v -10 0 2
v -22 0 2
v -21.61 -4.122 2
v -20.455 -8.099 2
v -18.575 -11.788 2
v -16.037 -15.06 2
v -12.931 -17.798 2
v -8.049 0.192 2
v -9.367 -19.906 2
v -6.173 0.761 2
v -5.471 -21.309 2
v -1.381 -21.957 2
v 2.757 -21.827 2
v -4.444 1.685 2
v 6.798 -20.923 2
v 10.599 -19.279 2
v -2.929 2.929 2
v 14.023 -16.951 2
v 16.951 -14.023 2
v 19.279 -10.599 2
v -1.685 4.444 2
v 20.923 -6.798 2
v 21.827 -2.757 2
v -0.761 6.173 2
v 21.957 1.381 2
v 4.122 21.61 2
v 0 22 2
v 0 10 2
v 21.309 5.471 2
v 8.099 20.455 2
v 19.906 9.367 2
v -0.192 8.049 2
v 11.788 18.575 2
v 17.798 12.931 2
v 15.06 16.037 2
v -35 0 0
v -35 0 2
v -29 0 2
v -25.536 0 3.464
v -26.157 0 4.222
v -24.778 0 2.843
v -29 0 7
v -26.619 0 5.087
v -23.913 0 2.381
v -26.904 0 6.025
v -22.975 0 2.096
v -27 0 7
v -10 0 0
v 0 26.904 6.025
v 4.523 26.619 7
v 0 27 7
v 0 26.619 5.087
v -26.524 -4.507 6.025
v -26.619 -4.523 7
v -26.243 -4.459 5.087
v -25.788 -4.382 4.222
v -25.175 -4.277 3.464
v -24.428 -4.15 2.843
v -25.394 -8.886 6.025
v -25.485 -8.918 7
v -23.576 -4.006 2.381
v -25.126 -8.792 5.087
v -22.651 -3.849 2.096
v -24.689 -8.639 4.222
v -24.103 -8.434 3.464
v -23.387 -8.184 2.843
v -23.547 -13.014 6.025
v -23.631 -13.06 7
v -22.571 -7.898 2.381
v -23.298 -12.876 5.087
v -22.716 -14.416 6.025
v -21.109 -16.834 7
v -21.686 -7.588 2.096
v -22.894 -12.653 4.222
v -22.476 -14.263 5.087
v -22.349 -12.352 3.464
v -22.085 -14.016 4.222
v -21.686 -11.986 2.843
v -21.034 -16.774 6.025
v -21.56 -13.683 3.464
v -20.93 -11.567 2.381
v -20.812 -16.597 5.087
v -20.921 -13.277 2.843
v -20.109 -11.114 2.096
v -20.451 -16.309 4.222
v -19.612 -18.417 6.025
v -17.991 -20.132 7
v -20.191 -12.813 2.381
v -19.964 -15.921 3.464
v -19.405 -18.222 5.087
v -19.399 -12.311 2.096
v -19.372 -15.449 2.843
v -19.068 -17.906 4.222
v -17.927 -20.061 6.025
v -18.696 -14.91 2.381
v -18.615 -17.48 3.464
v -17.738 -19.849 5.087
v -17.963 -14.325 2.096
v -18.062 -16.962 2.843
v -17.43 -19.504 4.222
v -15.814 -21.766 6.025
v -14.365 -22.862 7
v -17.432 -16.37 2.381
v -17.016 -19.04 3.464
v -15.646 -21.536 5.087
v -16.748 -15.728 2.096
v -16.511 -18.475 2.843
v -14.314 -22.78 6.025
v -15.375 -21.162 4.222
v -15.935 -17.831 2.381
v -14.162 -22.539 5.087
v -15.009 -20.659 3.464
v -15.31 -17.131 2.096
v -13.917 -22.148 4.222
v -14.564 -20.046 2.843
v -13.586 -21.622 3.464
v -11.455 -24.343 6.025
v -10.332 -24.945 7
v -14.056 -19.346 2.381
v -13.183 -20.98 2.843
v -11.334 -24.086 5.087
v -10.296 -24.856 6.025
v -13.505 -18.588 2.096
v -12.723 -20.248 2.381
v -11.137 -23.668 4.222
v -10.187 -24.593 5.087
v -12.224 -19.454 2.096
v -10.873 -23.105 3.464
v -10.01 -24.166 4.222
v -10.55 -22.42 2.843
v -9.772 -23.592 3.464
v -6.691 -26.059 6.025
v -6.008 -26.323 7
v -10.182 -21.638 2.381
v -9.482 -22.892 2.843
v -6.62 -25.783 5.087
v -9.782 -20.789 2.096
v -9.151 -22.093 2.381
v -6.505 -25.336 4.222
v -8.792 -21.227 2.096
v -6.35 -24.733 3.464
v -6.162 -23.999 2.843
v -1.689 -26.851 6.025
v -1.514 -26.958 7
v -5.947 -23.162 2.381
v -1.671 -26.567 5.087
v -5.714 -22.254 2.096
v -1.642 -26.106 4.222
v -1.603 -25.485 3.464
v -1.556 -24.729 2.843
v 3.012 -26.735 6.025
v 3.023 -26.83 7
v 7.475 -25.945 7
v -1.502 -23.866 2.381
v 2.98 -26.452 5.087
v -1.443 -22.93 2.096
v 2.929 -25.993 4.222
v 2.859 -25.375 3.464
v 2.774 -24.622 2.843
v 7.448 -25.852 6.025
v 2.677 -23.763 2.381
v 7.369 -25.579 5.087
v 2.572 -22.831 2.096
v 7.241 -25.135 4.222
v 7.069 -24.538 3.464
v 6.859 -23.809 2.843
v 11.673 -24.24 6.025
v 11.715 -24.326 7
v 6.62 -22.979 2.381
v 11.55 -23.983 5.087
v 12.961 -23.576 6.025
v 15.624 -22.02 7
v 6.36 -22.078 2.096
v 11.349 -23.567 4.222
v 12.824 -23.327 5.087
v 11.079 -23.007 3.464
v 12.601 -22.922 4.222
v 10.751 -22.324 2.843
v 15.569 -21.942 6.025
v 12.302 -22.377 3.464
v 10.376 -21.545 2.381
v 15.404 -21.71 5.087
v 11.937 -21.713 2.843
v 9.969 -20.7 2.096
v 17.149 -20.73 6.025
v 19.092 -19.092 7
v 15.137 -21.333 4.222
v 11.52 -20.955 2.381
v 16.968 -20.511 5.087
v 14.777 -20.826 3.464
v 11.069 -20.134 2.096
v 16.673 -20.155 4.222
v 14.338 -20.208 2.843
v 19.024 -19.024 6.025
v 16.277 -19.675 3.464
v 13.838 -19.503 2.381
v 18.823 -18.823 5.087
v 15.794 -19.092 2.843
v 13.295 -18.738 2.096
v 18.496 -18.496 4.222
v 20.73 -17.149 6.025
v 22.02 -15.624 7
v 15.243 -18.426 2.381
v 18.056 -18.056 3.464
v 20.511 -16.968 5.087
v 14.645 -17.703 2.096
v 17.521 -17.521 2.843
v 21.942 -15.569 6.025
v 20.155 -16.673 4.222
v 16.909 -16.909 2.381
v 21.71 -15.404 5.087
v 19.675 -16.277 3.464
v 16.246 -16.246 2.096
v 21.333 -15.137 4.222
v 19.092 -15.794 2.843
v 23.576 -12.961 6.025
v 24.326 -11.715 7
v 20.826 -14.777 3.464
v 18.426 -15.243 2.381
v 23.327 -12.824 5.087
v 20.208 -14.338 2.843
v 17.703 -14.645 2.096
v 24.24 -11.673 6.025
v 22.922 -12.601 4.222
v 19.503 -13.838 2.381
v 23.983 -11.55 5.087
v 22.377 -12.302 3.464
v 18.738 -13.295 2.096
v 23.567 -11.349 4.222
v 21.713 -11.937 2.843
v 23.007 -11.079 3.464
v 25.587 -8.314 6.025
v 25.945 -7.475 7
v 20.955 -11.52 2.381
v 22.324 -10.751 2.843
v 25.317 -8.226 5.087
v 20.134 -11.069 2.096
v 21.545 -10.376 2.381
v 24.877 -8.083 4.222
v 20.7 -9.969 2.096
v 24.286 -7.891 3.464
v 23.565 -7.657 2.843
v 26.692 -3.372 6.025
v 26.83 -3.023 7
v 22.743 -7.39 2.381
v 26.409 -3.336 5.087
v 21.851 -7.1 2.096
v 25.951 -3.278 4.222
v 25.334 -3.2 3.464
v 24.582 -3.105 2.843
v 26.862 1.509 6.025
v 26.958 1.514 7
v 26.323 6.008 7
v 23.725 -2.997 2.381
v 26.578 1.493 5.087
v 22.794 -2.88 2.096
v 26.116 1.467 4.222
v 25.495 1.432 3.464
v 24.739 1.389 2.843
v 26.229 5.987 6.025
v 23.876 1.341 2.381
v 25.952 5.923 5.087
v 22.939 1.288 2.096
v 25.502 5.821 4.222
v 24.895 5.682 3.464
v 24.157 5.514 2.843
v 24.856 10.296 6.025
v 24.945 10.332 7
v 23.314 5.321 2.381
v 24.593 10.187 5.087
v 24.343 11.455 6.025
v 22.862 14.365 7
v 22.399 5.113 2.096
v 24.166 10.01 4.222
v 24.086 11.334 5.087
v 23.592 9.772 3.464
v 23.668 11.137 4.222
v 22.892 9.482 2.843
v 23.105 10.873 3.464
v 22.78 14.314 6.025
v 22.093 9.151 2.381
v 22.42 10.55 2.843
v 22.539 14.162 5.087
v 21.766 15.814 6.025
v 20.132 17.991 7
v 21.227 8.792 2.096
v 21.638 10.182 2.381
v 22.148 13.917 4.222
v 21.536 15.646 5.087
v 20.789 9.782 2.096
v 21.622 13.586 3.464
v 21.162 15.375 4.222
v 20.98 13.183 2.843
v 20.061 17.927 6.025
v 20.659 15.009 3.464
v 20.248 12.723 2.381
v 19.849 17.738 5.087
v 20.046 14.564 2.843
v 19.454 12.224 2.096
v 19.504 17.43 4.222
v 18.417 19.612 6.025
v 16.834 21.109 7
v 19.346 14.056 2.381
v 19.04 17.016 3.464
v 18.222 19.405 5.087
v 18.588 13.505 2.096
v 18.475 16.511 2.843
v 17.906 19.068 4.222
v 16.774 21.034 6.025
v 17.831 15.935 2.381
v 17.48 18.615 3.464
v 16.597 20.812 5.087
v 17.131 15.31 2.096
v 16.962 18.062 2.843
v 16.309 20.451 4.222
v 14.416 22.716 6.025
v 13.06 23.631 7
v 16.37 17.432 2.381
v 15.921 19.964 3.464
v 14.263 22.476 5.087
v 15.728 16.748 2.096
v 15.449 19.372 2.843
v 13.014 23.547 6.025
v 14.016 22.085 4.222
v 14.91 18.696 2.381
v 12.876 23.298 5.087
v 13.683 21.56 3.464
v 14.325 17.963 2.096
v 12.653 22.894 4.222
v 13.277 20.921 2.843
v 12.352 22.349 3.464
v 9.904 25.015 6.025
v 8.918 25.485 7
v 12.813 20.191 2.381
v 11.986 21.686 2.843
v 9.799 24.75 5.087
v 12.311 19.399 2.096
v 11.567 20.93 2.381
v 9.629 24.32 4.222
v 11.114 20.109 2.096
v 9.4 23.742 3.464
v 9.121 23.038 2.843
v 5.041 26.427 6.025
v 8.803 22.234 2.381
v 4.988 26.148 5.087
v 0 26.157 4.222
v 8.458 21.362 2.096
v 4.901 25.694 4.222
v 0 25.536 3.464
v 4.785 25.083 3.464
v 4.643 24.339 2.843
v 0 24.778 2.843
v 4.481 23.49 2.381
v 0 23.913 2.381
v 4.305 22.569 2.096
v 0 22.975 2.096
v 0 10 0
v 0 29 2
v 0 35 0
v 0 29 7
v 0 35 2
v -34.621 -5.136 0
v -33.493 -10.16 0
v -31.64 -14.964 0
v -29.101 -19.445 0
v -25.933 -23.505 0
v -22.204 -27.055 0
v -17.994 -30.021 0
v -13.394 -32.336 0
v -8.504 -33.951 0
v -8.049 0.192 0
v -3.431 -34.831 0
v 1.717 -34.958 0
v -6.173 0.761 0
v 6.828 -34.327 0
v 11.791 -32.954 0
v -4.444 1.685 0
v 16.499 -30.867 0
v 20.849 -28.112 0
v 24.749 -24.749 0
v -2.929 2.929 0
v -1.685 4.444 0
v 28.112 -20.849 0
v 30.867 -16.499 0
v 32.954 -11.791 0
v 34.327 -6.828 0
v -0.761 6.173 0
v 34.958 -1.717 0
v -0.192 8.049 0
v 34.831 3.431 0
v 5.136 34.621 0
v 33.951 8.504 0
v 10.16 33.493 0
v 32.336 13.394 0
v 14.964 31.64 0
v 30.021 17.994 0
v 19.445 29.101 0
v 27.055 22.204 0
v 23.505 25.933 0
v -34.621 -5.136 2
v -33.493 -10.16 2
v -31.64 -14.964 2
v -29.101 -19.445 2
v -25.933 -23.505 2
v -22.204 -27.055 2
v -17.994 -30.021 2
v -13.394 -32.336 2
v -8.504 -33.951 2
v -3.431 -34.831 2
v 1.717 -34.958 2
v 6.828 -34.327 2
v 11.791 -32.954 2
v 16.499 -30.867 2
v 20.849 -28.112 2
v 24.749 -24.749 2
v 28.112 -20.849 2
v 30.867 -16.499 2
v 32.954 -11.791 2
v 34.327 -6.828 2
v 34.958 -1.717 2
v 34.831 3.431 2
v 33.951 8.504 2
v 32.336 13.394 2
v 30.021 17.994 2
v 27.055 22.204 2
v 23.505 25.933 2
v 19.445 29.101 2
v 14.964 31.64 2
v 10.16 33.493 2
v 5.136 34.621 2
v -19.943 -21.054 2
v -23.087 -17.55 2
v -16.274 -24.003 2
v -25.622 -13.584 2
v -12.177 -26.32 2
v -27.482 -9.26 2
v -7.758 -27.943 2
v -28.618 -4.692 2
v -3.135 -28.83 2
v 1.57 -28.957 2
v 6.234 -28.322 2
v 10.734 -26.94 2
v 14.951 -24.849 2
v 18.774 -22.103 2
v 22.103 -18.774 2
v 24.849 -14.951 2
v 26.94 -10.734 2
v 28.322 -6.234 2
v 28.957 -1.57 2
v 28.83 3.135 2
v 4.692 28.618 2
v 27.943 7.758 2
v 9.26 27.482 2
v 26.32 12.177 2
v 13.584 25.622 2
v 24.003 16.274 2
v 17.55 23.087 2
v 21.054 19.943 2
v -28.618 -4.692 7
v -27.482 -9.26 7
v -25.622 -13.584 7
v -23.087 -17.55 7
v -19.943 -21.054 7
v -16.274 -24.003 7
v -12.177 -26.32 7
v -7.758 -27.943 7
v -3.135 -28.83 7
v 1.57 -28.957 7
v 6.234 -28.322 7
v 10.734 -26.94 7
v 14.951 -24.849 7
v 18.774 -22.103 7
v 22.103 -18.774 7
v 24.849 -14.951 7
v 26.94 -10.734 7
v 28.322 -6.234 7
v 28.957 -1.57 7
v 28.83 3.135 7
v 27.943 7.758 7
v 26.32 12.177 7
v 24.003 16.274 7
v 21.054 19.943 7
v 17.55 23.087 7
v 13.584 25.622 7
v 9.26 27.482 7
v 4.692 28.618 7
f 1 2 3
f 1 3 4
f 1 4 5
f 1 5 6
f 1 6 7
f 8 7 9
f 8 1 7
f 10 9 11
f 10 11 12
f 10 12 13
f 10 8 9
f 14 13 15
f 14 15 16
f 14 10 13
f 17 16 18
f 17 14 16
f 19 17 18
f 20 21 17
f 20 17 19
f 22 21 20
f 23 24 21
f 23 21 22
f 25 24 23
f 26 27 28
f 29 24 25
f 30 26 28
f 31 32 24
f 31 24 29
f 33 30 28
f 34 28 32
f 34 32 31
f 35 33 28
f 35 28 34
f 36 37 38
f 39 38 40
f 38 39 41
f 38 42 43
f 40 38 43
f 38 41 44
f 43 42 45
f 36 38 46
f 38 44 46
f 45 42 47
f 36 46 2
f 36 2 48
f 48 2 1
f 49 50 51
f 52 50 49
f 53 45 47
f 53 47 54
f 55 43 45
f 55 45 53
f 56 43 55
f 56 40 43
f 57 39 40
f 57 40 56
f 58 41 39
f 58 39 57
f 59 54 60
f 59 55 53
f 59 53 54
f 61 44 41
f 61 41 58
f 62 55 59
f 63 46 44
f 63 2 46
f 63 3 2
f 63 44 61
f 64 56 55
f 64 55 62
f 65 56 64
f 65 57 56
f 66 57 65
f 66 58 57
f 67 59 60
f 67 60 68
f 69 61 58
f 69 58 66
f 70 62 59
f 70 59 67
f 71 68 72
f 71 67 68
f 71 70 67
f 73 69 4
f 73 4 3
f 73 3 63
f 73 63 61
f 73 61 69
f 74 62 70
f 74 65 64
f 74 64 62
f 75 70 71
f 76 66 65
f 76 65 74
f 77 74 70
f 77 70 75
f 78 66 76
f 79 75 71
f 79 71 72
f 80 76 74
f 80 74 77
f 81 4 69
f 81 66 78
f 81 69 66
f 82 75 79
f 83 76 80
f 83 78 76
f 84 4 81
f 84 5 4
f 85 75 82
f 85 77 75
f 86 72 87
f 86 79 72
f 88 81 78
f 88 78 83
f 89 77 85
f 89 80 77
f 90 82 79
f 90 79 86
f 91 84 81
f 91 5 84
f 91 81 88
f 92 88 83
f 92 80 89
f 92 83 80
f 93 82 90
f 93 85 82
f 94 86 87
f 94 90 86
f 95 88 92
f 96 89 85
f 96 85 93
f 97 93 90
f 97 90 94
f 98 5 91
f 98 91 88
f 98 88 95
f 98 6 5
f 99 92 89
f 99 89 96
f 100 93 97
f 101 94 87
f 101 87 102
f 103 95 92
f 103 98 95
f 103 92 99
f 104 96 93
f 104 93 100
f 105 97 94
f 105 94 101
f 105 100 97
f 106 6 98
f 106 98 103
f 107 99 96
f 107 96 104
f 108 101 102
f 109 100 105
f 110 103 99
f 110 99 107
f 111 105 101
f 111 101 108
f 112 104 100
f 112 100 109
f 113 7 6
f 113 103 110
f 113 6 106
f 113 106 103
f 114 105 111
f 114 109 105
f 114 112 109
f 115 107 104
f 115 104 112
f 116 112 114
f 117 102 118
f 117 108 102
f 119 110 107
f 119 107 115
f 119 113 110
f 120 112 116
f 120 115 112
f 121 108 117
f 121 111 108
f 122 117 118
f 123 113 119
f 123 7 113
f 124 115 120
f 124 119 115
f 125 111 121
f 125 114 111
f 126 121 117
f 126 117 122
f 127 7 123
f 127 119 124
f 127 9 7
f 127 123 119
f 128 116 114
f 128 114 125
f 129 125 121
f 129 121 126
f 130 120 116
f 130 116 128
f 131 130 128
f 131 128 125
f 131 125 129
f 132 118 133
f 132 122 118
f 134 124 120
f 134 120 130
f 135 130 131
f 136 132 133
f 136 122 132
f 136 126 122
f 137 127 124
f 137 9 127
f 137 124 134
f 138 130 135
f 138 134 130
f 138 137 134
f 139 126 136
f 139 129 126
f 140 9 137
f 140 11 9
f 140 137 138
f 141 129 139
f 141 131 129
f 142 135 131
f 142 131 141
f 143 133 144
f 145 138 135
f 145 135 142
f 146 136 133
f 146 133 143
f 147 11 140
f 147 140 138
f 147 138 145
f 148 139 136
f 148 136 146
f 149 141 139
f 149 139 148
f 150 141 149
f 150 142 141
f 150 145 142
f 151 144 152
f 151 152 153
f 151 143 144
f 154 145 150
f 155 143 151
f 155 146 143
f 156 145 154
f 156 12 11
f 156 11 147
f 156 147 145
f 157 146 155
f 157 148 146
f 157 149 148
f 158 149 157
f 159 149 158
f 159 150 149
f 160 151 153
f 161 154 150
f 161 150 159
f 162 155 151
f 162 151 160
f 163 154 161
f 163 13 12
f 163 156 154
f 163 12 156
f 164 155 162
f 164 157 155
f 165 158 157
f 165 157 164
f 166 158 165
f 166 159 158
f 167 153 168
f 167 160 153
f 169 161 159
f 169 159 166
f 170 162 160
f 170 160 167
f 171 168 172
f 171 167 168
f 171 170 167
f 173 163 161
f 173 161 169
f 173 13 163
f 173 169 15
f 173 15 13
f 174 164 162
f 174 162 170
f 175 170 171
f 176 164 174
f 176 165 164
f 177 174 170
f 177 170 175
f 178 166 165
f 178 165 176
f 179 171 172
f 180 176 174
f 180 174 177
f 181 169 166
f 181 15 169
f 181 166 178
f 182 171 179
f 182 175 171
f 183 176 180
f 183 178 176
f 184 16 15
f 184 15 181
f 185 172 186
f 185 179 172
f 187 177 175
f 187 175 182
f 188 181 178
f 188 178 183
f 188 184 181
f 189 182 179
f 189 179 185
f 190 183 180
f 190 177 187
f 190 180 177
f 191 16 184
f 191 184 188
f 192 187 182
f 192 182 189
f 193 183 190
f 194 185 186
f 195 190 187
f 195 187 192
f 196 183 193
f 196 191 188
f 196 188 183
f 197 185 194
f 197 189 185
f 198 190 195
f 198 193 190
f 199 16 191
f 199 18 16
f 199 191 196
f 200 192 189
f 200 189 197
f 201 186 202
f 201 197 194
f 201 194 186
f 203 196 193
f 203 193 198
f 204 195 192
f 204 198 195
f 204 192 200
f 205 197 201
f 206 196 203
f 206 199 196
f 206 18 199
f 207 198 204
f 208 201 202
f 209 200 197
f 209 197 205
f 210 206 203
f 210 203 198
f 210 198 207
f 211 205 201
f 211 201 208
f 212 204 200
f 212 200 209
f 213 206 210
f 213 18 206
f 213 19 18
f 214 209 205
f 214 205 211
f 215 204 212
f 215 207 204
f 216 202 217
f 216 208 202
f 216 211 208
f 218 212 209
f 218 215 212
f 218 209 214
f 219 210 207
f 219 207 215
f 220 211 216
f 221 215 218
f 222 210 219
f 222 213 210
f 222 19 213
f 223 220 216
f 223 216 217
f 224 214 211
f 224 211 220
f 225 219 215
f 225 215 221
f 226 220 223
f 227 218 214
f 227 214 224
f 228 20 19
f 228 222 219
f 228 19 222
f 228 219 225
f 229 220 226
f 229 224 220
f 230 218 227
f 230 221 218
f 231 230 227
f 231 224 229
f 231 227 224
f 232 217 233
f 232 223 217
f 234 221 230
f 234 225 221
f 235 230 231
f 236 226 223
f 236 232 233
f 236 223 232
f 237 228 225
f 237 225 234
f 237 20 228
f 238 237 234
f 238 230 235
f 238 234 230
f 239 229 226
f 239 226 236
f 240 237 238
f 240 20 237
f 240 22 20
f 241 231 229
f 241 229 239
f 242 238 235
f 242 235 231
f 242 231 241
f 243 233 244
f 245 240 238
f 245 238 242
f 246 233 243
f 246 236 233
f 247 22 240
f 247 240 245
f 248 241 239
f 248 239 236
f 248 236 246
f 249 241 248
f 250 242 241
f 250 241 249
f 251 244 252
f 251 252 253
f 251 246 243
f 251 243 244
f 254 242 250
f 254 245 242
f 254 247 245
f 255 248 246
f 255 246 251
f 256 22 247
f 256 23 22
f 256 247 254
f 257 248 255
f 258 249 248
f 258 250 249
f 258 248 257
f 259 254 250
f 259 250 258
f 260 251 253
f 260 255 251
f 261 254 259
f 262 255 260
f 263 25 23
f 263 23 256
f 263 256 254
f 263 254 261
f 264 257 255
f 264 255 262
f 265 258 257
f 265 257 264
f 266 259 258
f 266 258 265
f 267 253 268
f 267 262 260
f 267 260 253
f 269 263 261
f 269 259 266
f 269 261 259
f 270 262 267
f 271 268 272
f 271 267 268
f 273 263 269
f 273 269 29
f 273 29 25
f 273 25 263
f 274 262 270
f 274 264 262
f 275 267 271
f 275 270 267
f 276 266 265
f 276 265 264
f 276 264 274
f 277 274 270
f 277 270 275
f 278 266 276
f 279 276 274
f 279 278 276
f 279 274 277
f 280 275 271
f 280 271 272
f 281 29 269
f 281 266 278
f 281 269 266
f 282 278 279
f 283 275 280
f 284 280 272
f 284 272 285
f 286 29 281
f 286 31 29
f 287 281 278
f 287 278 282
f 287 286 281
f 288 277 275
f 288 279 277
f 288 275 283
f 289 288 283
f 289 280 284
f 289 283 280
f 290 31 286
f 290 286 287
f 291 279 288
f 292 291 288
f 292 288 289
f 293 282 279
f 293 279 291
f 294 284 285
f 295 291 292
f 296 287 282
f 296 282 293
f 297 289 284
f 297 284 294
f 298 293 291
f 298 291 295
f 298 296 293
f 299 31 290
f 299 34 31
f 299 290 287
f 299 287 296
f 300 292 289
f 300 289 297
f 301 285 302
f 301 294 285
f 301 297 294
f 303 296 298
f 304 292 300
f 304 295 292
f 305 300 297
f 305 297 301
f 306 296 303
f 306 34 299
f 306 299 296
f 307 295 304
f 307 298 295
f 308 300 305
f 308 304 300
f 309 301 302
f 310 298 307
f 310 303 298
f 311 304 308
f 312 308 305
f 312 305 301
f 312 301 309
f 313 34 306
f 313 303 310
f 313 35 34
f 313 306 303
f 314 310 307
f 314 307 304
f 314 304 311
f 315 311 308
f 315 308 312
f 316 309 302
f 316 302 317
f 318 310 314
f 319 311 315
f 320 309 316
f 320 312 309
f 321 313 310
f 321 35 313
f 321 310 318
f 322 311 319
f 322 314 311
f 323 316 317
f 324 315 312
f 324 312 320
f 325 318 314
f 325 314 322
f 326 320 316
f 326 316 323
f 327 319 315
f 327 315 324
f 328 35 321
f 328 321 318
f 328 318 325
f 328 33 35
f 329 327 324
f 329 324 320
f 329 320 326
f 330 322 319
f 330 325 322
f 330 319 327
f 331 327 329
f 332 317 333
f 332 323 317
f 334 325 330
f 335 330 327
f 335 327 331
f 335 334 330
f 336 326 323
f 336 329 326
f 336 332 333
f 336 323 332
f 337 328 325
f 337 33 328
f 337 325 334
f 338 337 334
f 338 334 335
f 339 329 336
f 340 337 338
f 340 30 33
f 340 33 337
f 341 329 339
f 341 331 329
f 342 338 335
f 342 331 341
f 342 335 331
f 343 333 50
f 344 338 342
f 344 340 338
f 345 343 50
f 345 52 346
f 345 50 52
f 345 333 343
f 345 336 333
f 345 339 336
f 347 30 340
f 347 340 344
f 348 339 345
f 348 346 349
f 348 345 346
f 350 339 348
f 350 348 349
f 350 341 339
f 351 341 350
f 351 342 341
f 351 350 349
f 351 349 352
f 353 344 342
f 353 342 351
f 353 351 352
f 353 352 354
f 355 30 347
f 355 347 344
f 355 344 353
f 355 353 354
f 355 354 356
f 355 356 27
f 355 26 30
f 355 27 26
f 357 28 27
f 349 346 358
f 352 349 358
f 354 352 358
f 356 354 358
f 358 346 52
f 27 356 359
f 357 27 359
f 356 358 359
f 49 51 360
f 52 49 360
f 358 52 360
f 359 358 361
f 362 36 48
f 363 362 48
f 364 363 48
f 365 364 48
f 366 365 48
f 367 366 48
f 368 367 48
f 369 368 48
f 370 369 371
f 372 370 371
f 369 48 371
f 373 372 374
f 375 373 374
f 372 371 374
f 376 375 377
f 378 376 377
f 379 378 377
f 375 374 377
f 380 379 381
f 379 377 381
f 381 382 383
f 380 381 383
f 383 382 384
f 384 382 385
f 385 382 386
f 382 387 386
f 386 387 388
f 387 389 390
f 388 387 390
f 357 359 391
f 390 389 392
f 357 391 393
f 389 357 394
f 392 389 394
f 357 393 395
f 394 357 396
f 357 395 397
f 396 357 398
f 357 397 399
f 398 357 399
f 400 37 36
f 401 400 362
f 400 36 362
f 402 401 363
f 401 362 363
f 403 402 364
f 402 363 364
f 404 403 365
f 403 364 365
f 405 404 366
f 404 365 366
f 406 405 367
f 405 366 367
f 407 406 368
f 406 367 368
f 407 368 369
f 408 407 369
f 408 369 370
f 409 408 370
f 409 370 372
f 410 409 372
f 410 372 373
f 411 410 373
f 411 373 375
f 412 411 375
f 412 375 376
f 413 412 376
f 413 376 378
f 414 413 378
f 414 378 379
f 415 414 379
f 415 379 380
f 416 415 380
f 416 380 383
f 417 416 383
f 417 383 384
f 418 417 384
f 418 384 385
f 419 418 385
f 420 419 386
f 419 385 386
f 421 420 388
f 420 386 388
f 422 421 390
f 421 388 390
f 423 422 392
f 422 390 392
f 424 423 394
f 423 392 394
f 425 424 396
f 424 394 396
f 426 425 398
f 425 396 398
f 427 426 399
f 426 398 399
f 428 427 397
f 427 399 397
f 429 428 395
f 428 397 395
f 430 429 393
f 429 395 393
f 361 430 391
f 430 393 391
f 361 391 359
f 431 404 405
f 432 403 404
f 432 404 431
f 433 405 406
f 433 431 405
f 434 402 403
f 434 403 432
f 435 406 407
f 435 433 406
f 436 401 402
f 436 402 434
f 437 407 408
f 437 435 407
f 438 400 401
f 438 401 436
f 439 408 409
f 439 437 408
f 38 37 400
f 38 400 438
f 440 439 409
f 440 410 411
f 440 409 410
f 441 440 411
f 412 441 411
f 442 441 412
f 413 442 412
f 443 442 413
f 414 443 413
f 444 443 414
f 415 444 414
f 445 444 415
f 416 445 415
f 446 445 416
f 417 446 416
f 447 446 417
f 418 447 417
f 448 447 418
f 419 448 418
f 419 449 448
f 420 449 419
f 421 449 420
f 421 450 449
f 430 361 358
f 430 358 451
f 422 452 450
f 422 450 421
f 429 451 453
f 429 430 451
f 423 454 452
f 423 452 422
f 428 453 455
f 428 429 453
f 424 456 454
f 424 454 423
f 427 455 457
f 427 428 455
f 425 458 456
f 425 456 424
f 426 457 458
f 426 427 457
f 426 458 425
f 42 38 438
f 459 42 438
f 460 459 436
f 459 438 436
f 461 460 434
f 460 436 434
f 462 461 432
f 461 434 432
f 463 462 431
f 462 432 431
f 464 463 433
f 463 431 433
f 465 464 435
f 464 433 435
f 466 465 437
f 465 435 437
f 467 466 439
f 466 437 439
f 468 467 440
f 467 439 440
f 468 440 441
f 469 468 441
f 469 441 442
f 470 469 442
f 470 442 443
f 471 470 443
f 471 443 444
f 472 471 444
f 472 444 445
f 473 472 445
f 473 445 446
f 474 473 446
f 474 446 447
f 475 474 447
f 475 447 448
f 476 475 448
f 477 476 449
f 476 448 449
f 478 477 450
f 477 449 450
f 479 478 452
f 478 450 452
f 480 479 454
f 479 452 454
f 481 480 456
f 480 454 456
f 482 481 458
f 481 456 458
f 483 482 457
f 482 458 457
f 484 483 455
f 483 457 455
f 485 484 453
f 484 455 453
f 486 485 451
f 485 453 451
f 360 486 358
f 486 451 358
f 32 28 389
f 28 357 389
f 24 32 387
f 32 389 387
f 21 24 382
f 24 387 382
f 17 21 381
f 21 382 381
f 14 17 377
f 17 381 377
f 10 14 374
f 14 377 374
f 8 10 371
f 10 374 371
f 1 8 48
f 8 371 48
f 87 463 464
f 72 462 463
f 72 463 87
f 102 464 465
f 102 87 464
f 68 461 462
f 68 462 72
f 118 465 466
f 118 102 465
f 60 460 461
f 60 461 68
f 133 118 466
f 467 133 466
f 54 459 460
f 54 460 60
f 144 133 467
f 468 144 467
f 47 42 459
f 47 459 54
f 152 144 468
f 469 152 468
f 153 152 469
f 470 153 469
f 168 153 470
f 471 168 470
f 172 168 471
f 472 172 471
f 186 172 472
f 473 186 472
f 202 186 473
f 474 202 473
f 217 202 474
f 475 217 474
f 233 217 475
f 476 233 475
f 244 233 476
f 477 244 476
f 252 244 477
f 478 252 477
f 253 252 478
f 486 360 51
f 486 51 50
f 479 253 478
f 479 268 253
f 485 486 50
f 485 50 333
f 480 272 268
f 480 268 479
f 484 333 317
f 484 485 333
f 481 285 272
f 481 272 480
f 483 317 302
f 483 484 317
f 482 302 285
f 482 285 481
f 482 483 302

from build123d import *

# Parameters (mm, degrees)
F0_R          = 35
F1_DEPTH      = 2
F2_R          = 29
F3_DEPTH      = 5
F4_R          = 27
F5_DEPTH      = 5
F6_W          = 45.179169625
F6_H          = 45.1430678368
F7_DEPTH      = 2.001
F7_DEPTH_BACK = 5.001
F8_R          = 4.99999
F9_R          = 10


# Not quite as in the source:
# - a fillet or chamfer is up to 0.001 mm smaller than in the source, because OpenCascade refuses the exact size


with BuildPart() as f1:
    # F0 (on Top) → F1 (new body)
    with BuildSketch(Plane.XY):
        Circle(F0_R)
    extrude(amount=F1_DEPTH)

    # F2 (on face) → F3 (join)
    with BuildSketch(Plane.XY.offset(2)):
        Circle(F2_R)
    extrude(amount=F3_DEPTH)

    # F4 (on face) → F5 (cut, through all)
    with BuildSketch(Plane.XY.offset(7)):
        Circle(F4_R)
    extrude(amount=-F5_DEPTH, mode=Mode.SUBTRACT)

    # F6 (on face) → F7 (cut, two sides)
    with BuildSketch(Plane.XY.offset(2)) as f7_sk:
        with Locations((-22.5895848125, 22.5715339184)):
            Rectangle(F6_W, F6_H)
    extrude(amount=-F7_DEPTH, mode=Mode.SUBTRACT)
    extrude(f7_sk.sketch, amount=F7_DEPTH_BACK, mode=Mode.SUBTRACT)

    # F8 (radius 5 in the source; OpenCascade refuses exactly that, so slightly less here)
    f8_edges = [f1.edges().sort_by_distance(p)[0] for p in [
        (19.091883, -19.091883, 2),
    ]]
    fillet(f8_edges, radius=F8_R)

    # F9
    f9_edges = [f1.edges().sort_by_distance(p)[0] for p in [
        (0, 0, 1),
    ]]
    fillet(f9_edges, radius=F9_R)


solid = f1.part
